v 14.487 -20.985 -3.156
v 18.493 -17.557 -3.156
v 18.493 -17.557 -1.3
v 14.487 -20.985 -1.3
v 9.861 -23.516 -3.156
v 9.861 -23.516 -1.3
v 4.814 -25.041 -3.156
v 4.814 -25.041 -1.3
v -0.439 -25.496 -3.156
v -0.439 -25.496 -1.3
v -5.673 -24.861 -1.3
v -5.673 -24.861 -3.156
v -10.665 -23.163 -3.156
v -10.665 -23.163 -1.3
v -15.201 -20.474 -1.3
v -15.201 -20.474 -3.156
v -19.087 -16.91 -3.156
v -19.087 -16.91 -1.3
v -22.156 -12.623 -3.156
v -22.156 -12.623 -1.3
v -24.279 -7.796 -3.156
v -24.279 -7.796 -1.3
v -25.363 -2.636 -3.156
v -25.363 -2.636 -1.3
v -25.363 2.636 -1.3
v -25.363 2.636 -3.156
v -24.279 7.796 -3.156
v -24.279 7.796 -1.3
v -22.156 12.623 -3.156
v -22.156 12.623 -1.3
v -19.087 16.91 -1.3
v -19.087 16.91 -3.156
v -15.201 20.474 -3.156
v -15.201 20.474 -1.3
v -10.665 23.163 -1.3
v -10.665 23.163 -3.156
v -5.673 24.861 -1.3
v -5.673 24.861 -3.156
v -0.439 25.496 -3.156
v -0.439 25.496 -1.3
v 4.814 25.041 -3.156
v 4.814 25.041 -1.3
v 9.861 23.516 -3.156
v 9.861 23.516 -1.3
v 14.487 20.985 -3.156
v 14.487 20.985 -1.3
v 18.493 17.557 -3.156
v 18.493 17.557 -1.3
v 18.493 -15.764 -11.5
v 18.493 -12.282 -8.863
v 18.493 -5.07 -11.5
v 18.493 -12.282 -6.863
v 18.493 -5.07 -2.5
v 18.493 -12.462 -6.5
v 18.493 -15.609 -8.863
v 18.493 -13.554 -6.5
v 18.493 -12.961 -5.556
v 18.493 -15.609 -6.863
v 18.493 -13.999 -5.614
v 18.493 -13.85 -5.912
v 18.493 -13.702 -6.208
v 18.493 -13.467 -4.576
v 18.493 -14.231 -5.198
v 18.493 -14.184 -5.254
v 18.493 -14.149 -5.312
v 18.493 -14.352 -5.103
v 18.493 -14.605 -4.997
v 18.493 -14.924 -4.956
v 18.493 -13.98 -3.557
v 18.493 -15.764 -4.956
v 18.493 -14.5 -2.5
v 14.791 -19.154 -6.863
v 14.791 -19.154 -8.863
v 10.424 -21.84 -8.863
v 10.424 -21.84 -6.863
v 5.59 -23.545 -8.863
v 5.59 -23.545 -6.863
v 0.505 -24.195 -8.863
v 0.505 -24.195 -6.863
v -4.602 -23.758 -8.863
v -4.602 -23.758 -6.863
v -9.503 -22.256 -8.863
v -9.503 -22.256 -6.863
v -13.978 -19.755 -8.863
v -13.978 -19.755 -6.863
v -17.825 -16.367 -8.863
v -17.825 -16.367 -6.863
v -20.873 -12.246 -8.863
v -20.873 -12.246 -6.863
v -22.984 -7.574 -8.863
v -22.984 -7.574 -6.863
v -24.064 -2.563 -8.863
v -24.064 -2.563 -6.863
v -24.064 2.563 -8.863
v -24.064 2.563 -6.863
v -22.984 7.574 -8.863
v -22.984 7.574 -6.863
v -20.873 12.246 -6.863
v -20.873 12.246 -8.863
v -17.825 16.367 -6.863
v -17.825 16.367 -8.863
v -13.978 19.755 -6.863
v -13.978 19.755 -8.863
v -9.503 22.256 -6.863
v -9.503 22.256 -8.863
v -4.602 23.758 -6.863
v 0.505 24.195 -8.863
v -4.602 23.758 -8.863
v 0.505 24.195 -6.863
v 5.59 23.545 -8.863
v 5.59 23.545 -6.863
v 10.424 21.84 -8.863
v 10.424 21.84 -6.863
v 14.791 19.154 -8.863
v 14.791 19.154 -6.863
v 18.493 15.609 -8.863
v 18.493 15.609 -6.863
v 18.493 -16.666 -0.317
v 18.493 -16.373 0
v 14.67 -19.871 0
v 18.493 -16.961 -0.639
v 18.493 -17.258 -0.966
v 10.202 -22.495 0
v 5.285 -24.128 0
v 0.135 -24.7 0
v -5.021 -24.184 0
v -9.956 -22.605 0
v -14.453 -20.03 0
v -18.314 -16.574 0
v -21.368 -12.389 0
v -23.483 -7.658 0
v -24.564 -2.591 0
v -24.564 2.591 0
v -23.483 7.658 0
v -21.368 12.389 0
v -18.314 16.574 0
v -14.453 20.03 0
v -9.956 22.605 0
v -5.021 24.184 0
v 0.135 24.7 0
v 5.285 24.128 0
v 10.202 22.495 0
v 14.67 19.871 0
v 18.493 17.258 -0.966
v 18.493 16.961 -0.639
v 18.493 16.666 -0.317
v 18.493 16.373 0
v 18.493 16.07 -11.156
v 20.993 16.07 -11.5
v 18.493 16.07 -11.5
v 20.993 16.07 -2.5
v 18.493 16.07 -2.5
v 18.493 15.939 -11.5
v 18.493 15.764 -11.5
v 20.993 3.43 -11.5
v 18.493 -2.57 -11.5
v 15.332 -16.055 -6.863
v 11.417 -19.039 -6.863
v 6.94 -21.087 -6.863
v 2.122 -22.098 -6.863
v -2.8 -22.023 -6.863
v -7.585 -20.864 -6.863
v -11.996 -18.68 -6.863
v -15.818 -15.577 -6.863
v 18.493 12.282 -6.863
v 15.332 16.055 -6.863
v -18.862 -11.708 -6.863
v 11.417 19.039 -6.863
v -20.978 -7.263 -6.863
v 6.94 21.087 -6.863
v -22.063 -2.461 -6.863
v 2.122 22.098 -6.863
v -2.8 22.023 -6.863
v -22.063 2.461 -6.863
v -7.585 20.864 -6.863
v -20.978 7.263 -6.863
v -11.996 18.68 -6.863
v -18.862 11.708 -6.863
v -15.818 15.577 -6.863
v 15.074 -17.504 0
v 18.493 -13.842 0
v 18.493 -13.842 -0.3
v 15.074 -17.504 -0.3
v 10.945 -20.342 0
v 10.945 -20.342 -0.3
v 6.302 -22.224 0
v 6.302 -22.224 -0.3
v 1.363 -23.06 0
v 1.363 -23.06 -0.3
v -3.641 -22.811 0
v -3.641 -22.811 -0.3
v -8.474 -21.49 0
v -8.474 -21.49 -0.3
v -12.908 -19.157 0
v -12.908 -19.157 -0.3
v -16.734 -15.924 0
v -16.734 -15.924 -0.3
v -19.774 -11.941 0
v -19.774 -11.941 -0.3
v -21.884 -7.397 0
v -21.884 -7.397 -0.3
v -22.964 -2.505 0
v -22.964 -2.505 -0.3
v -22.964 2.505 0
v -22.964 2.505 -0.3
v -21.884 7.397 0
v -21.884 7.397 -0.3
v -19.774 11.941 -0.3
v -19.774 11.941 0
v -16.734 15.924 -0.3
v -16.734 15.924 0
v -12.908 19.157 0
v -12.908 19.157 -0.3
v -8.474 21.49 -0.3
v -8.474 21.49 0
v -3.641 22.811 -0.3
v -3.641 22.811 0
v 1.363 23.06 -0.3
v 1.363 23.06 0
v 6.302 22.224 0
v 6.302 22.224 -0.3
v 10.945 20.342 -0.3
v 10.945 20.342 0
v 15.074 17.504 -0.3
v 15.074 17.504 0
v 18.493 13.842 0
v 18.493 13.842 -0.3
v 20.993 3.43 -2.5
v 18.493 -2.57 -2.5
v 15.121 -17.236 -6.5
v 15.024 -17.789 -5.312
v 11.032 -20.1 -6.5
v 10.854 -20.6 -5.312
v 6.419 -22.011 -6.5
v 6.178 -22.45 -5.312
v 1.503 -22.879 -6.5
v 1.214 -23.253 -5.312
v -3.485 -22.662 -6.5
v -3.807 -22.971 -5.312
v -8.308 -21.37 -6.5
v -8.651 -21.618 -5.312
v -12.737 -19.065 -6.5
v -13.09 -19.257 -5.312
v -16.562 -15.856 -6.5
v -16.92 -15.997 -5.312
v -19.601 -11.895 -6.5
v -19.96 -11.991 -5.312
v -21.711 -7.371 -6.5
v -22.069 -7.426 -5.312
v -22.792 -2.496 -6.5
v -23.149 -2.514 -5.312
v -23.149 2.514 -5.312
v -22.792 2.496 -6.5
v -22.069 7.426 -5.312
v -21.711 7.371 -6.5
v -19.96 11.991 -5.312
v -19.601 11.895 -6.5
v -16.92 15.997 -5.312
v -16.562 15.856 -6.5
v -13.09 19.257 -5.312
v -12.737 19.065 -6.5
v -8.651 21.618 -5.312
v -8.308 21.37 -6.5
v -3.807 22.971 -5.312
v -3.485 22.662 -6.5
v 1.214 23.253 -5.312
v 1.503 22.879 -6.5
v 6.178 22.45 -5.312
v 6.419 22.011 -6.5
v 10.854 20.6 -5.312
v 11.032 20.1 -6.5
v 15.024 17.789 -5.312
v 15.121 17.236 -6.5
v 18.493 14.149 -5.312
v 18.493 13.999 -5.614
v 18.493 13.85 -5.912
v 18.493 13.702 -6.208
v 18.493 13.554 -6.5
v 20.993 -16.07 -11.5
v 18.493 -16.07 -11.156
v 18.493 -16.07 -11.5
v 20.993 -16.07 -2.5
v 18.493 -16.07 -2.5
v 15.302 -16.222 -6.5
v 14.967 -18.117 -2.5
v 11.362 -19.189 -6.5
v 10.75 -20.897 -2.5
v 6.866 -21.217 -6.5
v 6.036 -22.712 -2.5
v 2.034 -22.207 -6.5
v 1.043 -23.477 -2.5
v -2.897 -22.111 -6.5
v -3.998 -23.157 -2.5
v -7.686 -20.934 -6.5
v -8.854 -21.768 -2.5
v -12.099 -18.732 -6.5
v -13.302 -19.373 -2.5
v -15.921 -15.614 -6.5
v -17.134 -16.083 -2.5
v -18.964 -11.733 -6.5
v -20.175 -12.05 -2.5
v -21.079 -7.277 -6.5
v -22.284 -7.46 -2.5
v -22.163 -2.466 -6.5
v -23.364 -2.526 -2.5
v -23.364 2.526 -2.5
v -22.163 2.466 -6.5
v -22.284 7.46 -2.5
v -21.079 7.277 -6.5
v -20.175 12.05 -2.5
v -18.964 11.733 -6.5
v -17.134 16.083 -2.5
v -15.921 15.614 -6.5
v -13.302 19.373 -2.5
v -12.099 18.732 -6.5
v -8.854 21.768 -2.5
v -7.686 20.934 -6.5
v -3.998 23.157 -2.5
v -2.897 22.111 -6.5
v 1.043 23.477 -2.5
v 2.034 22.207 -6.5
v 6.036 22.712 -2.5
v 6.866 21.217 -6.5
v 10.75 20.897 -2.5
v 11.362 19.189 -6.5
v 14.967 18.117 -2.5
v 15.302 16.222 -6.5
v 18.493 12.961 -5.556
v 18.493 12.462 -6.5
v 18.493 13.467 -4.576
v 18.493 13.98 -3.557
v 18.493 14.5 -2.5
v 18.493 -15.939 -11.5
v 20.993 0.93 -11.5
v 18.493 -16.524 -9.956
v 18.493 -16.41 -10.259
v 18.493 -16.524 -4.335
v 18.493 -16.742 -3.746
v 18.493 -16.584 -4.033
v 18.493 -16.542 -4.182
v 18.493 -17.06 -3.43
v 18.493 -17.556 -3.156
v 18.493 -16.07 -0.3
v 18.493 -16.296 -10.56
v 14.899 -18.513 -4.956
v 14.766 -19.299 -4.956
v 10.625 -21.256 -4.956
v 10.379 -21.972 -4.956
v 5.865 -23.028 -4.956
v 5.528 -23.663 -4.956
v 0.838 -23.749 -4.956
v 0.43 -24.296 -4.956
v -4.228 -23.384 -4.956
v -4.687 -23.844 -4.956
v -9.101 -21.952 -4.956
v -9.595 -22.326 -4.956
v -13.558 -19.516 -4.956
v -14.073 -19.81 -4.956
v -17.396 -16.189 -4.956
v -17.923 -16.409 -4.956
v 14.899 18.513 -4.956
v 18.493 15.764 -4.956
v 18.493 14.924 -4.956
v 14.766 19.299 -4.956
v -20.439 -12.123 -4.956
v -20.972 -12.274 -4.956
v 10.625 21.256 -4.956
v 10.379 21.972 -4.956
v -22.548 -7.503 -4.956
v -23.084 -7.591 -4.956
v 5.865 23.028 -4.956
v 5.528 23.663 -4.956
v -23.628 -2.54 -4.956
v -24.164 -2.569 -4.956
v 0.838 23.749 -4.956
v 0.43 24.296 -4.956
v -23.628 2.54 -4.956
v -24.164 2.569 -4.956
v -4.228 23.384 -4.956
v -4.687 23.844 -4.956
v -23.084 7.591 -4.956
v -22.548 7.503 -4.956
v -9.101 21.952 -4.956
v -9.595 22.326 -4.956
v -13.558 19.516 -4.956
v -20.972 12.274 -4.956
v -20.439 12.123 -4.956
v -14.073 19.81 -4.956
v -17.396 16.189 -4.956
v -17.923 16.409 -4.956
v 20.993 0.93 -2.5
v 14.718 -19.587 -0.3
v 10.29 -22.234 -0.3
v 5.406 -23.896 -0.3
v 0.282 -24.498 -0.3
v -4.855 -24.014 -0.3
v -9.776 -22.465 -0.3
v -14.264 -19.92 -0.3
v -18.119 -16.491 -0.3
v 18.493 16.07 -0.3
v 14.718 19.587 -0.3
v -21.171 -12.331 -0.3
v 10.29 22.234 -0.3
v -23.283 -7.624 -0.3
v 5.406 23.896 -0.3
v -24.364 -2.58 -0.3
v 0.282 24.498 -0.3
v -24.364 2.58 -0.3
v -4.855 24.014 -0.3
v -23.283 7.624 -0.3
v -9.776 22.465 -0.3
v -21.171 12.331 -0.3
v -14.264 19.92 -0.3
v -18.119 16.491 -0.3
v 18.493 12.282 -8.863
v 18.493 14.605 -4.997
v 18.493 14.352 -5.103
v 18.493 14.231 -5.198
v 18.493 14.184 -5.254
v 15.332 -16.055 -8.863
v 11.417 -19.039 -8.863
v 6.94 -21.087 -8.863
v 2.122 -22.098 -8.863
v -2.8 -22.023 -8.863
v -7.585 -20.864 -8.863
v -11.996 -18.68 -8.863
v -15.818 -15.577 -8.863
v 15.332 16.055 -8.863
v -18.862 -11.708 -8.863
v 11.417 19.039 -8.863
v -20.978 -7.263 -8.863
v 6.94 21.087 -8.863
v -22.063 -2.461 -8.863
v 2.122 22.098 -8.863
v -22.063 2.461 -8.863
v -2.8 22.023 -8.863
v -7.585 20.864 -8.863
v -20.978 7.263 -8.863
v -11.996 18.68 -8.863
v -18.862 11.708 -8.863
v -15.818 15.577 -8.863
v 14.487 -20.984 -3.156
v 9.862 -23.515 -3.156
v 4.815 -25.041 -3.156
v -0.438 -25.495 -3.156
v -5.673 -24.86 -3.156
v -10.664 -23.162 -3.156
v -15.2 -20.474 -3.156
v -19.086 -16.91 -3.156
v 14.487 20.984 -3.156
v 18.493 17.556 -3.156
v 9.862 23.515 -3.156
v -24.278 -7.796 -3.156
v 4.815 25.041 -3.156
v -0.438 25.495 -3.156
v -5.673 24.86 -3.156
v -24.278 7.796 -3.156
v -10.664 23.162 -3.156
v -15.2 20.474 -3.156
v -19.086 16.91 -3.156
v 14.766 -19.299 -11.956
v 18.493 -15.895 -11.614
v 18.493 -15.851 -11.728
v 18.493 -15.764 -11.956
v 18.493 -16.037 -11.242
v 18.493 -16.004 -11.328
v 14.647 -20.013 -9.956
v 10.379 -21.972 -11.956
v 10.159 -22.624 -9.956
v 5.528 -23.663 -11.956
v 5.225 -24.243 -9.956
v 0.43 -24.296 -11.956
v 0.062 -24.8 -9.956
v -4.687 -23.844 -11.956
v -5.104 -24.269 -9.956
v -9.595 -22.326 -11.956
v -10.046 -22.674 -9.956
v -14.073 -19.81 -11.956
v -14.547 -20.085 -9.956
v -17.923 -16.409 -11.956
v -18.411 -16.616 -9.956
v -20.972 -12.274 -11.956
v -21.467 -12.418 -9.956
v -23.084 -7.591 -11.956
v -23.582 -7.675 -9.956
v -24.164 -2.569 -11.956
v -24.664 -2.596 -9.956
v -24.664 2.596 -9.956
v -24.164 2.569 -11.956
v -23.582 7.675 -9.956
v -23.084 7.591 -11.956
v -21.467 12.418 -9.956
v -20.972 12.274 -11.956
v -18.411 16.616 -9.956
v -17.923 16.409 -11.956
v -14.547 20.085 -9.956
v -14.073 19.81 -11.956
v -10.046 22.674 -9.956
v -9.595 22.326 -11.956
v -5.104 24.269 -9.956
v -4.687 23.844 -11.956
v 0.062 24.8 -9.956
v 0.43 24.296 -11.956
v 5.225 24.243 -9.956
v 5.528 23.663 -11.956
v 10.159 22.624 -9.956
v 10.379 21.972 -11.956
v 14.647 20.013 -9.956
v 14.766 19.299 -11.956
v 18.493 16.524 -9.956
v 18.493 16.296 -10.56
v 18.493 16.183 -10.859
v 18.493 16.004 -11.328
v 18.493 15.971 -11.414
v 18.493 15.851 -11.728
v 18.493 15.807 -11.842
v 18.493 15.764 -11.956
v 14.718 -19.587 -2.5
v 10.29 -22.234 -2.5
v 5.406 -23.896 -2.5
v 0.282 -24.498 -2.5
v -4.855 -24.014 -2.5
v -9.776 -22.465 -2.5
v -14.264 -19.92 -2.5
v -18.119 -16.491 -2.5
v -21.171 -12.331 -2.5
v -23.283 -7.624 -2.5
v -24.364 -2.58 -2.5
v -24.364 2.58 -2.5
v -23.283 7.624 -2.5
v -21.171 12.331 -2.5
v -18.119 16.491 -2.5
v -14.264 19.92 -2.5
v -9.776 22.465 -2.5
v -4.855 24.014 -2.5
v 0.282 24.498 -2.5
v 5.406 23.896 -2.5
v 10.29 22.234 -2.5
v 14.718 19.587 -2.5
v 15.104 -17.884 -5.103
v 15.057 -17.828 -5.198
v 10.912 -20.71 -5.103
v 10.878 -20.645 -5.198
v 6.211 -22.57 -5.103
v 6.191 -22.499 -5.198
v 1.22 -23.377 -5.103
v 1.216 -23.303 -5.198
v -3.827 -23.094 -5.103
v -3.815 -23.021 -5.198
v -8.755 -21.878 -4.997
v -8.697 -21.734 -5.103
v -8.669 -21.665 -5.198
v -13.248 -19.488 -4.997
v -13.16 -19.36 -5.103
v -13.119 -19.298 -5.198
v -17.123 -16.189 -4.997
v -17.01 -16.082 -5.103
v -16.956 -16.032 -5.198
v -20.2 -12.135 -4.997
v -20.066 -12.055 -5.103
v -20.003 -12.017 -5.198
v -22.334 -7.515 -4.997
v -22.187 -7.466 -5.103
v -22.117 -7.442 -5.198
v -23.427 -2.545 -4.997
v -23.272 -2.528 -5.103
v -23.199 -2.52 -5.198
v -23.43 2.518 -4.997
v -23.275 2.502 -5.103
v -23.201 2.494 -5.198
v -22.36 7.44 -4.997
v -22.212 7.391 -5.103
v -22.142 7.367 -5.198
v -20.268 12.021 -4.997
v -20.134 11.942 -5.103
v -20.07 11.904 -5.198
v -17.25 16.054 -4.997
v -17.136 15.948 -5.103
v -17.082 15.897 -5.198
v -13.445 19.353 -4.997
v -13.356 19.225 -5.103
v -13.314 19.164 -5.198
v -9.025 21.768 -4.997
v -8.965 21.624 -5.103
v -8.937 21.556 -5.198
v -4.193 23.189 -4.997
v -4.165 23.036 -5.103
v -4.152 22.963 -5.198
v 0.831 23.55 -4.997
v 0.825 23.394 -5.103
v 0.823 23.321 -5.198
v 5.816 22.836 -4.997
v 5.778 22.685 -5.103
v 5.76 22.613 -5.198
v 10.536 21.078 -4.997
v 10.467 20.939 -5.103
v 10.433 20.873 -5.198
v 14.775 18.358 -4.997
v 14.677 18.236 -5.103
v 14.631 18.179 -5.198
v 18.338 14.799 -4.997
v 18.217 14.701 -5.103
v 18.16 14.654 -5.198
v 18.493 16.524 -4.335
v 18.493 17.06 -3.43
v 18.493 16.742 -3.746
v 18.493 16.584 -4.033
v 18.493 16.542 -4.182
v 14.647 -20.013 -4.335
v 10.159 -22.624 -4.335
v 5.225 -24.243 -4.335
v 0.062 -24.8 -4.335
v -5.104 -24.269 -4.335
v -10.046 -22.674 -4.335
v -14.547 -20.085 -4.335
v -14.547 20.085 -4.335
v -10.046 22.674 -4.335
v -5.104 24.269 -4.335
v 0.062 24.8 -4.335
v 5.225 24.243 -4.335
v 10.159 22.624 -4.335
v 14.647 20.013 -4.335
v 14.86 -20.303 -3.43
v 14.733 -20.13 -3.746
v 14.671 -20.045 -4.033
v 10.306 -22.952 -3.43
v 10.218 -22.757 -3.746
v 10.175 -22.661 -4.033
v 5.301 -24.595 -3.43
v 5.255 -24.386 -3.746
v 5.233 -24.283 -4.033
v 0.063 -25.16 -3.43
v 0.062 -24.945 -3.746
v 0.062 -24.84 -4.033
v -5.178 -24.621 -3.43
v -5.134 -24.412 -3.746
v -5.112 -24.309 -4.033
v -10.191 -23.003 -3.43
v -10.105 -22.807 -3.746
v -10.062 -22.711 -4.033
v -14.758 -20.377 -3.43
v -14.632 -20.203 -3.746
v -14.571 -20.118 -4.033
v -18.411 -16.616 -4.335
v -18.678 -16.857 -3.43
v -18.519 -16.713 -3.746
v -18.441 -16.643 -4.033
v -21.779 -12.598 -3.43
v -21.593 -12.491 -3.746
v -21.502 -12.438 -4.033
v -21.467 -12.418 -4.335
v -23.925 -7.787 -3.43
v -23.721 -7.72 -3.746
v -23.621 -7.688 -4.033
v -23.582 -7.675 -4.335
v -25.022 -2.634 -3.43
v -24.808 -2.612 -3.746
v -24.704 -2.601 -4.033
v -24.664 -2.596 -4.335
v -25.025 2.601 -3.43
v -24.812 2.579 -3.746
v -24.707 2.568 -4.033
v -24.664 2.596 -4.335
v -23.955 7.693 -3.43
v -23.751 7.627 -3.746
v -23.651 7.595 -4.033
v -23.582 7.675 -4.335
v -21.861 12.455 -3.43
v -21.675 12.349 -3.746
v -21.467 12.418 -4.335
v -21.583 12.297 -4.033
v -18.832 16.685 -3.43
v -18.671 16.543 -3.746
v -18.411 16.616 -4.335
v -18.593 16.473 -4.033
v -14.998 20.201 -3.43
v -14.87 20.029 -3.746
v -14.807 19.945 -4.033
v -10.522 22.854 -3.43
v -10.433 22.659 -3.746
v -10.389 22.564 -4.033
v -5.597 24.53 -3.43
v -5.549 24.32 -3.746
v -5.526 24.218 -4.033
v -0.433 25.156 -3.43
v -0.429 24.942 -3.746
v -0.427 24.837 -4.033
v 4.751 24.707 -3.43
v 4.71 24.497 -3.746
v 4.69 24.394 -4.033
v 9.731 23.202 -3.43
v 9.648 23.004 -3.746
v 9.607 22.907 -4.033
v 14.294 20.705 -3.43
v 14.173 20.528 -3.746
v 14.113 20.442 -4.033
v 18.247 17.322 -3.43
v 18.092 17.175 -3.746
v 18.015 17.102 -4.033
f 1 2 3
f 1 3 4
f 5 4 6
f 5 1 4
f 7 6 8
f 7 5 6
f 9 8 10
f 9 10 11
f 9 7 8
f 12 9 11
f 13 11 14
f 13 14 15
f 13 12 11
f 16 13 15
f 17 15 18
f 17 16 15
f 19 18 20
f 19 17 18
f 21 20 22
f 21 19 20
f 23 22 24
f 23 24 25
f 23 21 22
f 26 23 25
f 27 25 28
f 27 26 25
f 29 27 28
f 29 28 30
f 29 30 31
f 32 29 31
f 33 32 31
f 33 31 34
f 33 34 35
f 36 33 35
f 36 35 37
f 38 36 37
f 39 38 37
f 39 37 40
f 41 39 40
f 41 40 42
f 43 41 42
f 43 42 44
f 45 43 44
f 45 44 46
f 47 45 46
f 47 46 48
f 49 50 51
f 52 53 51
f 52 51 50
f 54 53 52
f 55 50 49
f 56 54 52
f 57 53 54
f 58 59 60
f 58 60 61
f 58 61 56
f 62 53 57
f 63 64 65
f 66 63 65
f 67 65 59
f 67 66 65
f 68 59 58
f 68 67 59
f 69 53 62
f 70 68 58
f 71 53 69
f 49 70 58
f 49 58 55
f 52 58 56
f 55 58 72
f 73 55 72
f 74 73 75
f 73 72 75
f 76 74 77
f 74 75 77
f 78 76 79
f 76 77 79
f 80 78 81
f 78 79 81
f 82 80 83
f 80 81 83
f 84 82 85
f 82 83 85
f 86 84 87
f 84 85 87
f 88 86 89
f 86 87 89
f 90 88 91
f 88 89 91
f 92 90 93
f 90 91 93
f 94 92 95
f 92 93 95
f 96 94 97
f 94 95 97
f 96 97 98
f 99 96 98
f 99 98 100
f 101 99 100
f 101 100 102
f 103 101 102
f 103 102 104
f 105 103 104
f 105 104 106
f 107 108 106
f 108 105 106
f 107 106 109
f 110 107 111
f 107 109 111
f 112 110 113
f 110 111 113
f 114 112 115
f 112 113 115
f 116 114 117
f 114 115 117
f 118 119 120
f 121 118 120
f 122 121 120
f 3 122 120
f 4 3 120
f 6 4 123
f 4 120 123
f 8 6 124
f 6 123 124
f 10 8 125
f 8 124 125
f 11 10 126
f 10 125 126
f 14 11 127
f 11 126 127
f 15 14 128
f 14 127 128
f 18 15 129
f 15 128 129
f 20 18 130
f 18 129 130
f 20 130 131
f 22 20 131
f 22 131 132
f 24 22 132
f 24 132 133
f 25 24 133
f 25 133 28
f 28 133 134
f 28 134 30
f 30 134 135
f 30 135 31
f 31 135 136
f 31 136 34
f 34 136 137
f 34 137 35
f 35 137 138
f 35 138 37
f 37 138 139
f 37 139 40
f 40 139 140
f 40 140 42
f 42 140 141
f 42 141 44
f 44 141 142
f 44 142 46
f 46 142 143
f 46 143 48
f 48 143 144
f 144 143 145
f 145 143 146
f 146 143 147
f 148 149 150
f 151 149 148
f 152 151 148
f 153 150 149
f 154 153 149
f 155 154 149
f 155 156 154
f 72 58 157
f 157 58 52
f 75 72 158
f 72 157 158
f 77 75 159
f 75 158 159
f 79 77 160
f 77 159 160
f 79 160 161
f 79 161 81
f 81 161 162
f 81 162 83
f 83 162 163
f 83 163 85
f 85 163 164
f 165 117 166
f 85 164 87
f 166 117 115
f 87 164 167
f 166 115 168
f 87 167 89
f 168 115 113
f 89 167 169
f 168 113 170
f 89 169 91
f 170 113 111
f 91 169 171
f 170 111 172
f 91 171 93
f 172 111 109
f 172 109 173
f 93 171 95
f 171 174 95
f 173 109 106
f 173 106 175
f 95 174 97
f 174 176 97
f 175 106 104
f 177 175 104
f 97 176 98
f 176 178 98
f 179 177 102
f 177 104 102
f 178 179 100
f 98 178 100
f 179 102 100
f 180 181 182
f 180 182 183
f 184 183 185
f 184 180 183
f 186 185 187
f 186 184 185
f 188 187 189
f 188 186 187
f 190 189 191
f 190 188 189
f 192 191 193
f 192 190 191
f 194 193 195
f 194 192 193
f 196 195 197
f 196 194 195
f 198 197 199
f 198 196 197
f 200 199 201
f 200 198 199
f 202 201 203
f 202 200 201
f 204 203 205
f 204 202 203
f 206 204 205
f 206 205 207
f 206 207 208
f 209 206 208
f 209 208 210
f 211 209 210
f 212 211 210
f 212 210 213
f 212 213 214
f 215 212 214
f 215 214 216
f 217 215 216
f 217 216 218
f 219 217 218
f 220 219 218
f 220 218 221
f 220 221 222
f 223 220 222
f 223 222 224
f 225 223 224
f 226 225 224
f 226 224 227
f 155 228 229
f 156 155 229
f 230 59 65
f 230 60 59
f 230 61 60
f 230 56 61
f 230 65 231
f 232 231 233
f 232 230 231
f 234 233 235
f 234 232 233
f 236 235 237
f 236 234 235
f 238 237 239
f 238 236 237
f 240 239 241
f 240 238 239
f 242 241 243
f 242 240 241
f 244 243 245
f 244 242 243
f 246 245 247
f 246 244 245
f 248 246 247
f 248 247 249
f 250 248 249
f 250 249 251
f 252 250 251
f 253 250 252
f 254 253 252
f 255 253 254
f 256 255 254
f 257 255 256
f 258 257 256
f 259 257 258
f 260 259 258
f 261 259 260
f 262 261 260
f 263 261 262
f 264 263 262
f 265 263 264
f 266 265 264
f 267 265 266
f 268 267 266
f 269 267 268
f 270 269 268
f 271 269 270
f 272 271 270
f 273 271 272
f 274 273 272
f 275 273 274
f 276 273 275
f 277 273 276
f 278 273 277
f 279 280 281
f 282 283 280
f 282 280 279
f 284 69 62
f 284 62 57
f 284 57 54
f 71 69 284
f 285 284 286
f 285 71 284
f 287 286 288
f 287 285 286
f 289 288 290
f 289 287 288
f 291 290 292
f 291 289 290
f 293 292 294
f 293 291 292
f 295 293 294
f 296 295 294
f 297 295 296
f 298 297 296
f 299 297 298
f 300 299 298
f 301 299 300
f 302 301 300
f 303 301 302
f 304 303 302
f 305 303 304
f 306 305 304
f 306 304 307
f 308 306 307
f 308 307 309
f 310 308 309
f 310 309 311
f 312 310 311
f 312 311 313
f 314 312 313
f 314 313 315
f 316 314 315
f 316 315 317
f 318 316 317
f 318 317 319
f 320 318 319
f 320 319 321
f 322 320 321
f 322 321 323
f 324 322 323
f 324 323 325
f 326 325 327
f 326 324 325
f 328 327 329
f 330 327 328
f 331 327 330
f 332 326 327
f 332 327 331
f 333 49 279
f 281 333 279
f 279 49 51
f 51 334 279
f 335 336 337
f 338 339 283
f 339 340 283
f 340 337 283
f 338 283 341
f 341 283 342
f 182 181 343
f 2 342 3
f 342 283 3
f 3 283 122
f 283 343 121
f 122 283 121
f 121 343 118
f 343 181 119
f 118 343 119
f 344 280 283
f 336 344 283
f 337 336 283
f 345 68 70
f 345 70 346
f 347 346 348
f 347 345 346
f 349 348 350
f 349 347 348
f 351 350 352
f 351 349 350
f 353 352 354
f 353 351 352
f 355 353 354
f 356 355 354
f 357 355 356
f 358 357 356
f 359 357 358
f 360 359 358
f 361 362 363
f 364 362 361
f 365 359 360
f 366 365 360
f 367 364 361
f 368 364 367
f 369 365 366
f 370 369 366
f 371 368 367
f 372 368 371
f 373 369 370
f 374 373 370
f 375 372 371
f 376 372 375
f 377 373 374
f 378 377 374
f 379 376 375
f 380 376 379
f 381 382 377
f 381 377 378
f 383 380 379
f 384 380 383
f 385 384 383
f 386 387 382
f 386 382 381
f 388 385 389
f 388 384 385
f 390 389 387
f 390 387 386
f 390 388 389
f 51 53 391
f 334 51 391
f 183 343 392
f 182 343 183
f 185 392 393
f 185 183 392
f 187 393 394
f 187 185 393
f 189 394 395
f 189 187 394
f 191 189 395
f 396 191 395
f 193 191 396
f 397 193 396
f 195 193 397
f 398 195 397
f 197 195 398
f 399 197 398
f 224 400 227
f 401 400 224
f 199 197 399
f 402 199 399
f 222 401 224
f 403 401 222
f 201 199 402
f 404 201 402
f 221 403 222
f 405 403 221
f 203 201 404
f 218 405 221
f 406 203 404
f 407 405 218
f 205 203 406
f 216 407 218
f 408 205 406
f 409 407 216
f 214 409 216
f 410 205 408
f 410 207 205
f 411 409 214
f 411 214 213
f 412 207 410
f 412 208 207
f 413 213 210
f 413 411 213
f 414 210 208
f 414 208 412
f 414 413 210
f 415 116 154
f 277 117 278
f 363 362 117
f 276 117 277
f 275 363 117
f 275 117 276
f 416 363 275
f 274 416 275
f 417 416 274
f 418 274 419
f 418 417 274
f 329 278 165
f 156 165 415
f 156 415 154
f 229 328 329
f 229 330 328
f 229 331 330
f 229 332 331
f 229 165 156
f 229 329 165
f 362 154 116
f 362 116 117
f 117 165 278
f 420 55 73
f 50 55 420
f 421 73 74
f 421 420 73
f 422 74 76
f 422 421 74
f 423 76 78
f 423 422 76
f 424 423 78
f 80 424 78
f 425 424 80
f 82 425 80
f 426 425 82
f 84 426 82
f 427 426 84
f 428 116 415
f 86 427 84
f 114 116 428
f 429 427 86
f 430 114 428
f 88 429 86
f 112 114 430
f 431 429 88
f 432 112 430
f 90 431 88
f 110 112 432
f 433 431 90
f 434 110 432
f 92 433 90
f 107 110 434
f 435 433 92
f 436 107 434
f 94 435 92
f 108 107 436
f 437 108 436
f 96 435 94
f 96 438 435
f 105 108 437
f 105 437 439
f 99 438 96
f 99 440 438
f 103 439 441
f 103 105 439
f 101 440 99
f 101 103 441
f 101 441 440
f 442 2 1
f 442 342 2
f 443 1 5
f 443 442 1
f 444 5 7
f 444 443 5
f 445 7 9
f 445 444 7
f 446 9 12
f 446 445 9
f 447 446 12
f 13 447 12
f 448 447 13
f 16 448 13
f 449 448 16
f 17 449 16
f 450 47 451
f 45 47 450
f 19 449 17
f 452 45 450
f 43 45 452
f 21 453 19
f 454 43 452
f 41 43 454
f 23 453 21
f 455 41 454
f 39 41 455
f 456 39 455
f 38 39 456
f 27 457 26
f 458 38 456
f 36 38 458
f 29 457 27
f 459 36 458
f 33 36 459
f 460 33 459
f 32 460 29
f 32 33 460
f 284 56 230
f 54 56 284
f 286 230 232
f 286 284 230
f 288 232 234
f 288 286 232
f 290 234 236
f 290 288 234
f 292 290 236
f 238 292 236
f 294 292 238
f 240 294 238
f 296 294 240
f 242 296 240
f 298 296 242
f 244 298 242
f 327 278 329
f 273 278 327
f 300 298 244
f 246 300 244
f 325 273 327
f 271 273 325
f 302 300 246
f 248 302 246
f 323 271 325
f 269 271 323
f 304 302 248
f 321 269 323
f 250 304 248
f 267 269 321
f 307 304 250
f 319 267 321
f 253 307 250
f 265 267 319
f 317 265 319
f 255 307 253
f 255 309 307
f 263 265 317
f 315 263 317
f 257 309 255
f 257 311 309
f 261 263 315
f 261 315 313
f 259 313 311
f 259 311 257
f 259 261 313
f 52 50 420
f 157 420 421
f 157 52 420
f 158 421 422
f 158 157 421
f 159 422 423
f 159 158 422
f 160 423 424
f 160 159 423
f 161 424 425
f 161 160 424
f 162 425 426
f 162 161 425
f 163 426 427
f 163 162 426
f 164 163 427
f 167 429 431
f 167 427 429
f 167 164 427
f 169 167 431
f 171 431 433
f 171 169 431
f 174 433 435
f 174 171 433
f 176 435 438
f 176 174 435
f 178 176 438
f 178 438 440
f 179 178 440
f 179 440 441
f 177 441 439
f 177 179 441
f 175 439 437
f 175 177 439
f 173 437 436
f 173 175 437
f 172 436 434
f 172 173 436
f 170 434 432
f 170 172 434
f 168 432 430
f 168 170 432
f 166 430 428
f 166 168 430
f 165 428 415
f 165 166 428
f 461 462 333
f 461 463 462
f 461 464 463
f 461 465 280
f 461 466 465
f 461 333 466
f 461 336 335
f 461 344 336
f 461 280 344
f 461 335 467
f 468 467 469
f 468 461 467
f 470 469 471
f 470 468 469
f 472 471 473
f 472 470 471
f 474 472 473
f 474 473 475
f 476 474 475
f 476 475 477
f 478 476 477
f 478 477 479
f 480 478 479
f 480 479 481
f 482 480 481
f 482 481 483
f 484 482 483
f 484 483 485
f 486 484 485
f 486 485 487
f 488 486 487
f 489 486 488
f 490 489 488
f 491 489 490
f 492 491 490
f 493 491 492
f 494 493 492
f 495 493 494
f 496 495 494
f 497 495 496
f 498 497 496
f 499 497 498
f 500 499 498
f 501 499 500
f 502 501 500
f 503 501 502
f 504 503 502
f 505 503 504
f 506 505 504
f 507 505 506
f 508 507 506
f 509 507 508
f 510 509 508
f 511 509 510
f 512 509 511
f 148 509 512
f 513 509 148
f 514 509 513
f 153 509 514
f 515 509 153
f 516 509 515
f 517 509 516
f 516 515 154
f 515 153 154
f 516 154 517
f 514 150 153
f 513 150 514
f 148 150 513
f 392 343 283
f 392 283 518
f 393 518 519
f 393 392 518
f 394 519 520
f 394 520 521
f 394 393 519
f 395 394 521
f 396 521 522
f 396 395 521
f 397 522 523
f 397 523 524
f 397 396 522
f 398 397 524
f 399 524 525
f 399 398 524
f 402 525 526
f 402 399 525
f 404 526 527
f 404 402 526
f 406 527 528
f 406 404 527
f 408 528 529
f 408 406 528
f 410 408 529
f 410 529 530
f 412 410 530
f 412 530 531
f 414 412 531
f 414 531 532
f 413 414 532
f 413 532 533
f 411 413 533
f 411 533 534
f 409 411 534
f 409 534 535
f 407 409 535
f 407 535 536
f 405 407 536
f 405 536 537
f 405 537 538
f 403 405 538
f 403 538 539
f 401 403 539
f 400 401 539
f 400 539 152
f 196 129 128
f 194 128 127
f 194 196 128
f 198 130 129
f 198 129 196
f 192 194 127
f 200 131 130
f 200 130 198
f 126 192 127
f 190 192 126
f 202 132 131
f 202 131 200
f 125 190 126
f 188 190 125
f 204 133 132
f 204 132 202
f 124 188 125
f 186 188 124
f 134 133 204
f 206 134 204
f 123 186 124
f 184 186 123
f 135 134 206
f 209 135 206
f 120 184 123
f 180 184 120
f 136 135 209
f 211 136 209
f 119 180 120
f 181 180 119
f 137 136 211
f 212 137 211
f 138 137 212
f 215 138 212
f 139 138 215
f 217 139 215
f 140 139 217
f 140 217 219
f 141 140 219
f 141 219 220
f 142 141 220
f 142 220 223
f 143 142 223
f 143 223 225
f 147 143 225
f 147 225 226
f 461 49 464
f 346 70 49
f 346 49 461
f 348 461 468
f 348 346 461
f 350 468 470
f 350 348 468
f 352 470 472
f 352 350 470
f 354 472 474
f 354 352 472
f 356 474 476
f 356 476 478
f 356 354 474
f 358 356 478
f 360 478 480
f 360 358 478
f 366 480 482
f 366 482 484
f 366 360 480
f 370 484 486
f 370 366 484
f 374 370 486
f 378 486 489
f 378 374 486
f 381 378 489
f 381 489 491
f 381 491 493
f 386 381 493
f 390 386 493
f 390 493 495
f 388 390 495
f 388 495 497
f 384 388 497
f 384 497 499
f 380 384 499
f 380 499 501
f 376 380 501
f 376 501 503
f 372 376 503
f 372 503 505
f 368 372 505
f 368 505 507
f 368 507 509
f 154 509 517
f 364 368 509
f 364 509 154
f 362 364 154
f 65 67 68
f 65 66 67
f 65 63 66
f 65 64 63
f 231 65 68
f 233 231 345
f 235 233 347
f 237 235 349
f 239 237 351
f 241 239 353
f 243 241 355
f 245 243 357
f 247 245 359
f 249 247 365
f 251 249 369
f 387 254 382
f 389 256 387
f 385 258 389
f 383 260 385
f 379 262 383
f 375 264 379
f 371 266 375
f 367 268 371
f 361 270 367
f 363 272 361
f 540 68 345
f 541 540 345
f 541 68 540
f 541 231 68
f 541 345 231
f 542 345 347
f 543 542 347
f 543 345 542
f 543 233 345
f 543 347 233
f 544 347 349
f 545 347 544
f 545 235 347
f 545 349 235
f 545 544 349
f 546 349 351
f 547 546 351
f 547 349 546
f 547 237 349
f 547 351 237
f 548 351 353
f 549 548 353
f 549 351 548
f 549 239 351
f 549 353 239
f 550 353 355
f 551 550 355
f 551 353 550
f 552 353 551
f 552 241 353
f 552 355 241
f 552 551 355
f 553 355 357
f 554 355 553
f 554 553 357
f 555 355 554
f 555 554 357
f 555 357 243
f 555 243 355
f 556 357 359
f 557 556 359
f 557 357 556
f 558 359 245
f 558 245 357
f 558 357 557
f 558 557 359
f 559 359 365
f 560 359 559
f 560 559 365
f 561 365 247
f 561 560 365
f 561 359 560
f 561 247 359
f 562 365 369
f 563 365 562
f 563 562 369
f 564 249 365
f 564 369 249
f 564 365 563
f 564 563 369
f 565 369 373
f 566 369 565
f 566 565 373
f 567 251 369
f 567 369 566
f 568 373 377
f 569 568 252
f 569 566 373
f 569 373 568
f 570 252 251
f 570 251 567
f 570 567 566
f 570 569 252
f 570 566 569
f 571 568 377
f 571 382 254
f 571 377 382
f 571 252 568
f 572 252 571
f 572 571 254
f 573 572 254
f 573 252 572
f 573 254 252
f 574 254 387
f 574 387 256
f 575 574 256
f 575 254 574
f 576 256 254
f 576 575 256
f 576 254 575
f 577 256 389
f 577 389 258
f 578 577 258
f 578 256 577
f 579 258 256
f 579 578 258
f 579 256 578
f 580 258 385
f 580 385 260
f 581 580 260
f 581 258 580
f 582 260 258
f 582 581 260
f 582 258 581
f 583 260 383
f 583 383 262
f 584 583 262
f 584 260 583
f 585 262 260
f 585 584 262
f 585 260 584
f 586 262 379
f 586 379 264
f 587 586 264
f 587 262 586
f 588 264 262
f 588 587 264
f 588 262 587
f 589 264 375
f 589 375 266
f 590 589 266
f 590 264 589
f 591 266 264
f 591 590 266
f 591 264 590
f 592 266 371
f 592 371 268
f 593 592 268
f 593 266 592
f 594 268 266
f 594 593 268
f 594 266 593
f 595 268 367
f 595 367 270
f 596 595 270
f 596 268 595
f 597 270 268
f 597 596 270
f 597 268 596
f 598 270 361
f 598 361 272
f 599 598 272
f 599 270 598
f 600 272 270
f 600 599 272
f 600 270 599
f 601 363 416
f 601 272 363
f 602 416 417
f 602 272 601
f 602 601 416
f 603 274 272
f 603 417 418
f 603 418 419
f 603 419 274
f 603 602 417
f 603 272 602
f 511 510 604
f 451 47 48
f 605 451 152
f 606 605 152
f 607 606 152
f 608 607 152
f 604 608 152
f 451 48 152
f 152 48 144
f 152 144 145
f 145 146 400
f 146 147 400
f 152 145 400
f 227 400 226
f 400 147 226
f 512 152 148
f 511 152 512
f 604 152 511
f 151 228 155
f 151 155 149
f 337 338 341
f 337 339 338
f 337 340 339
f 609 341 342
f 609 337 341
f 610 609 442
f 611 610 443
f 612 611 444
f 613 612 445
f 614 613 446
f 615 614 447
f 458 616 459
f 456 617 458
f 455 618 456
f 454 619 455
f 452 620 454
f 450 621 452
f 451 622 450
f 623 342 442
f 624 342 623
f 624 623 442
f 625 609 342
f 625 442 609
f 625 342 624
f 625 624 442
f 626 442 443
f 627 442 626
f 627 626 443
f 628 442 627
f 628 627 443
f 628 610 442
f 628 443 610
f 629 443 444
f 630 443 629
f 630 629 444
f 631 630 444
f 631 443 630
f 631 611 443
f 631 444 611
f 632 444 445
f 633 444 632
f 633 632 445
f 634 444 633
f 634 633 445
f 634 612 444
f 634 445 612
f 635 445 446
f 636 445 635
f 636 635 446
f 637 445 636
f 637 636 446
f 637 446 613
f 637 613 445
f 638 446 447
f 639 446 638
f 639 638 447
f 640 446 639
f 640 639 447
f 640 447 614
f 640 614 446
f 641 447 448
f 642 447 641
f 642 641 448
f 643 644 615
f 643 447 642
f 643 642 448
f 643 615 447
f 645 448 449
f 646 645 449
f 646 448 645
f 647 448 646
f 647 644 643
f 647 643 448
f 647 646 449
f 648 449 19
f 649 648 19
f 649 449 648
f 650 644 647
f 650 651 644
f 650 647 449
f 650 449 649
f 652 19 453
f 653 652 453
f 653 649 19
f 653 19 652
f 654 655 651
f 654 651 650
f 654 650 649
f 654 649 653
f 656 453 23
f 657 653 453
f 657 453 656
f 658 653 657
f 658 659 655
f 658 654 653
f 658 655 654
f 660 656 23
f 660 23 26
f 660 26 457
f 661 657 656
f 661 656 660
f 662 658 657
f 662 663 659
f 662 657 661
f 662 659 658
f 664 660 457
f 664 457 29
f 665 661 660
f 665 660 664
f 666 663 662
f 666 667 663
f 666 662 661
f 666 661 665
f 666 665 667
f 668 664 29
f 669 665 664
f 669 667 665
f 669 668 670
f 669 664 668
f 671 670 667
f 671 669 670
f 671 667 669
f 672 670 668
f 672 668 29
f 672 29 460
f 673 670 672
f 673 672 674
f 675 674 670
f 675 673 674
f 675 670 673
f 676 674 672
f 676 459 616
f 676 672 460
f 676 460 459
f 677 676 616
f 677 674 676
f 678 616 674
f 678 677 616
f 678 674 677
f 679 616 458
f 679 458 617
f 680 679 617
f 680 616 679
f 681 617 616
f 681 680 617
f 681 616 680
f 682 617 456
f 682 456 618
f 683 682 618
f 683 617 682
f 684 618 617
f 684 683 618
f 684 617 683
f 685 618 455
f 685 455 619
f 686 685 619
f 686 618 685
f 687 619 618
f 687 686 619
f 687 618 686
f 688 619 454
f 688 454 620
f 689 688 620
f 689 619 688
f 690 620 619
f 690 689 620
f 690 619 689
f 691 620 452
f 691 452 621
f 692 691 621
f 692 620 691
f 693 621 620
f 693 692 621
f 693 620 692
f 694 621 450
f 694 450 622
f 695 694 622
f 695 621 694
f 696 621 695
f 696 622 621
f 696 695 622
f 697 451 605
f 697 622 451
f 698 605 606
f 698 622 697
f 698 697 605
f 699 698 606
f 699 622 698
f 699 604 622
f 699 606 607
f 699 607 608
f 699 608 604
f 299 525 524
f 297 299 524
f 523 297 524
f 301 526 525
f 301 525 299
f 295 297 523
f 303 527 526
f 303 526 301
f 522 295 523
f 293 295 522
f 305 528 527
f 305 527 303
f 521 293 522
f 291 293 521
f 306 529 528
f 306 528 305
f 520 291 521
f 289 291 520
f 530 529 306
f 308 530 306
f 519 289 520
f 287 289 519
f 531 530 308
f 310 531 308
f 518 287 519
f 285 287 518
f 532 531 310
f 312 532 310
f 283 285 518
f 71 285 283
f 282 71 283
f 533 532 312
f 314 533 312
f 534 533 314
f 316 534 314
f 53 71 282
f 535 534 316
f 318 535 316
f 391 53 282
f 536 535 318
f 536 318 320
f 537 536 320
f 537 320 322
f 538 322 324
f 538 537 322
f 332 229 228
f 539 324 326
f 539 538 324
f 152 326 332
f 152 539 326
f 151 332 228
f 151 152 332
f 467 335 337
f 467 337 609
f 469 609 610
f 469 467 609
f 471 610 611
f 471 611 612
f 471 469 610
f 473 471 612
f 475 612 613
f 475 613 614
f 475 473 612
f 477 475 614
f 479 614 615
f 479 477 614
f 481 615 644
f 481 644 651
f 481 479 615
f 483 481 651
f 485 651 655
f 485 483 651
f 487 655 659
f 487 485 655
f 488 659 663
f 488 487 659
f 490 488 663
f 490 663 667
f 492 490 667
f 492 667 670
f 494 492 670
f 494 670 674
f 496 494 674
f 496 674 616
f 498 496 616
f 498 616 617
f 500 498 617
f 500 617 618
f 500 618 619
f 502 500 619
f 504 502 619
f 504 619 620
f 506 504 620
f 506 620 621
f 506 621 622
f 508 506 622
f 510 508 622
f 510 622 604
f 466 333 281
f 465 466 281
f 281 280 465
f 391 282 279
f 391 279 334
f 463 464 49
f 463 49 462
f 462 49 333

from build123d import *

# Parameters (mm, degrees)
F0_W      = 1.4
F0_H      = 0.3
F0_W_2    = 2
F0_H_2    = 2
F4_SIZE2  = 0.49999
F4_SIZE   = 1.99999
F5_R      = 0.5
F7_DEPTH  = 25
F9_DEPTH  = 9
F11_DEPTH = 100


# Not quite as in the source:
# - a fillet or chamfer that OpenCascade refuses, or shapes differently, is made with other operations: its cross-section is extruded or revolved along the edge and cut away or added
# - a fillet or chamfer is up to 0.001 mm smaller than in the source, because OpenCascade refuses the exact size


with BuildPart() as f1:
    # F0 (on Front) → F1 (revolve)
    with BuildSketch(Plane.XZ):
        Polygon((-24.5, 0), (-25.5, 0), (-25.5, -3.1555826106), (-24.8, -3.1555826106), (-24.8, -11.9555826106), (-24.3, -11.9555826106), (-24.3, -4.9555826106), (-23.391673381, -4.9555826106), (-22.9283481642, -6.5), (-22.3, -6.5), (-23.5, -2.5), (-24.5, -2.5), (-24.5, -0.3), align=None)
        with Locations((-23.8, -0.15)):
            Rectangle(F0_W, F0_H)
    revolve(axis=Axis((0, 0, 1.0689813644), (0, 0, -1)))

    # F2: chamfer of 0.8 x 1.3 on 1 edges, made by hand

    # F2_s1 → F2_t2 (revolve, cut)
    with BuildSketch(Plane.XZ):
        Polygon((-25.5, -1.3), (-24.7, 0), (-25.5, 0), align=None)
    revolve(axis=Axis((0, 0, 0), (0, 0, -1)), mode=Mode.SUBTRACT)

    # F3: fillet of radius 1.4 on 1 edges, made by hand

    # F3_s1 → F3_t2 (revolve)
    with BuildSketch(Plane.XZ):
        with BuildLine():
            ThreePointArc((-25.4997998621, -3.1552362801), (-24.9872079854, -3.6681342757), (-24.7996, -4.3685755865))
            Line((-24.7996, -4.3685755865), (-24.6594634315, -4.3685755865))
            ThreePointArc((-24.6594634315, -4.3685755865), (-24.6598634315, -3.7620790985), (-24.6598634315, -3.1555826106))
            Line((-24.6598634315, -3.1555826106), (-24.8, -3.015446042))
            ThreePointArc((-24.8, -3.015446042), (-25.1498999311, -3.015446042), (-25.4296832798, -3.0339023494))
            Line((-25.4296832798, -3.0339023494), (-25.4997998621, -3.1552362801))
        make_face()
    revolve(axis=Axis((0, 0, -3.1555826106), (0, 0, -1)))

    # F4 (size 2 and 0.5 in the source; OpenCascade refuses exactly that, so slightly less here)
    f4_edges = [f1.edges().sort_by_distance(p)[0] for p in [
        (24.8, 0, -11.955583),
    ]]
    chamfer(f4_edges, length=F4_SIZE, length2=F4_SIZE2)

    # F5
    f5_edges = [f1.edges().sort_by_distance(p)[0] for p in [
        (23.391673, 0, -4.955583),
    ]]
    fillet(f5_edges, radius=F5_R)


with BuildPart() as f1b:
    # F0 (on Front) → F1, piece 2 (revolve)
    with BuildSketch(Plane.XZ):
        with Locations((-23.2, -7.8631715626)):
            Rectangle(F0_W_2, F0_H_2)
    revolve(axis=Axis((0, 0, 1.0689813644), (0, 0, -1)))


with BuildPart() as f7_tool:
    # F6 (on Top) → F7 (new body)
    with BuildSketch(Plane.XY):
        Polygon((18.4932420089, 17.5570498661), (18.4932420089, 14.5), (18.4932420089, -14.5), (18.4932420089, -17.5570498661), (23.4932420089, -17.5570498661), (23.4932420089, 17.5570498661), align=None)
        Polygon((18.4932420089, 29.2936375588), (18.4932420089, 17.5570498661), (23.4932420089, 17.5570498661), (23.4932420089, -17.5570498661), (18.4932420089, -17.5570498661), (18.4932420089, -27.3348336816), (60.3667099652, -27.3348336816), (60.3667099652, 29.2936375588), align=None)
    extrude(amount=-F7_DEPTH)


with BuildPart() as f1_1:
    add(f1.part)

    # F7: cut by f7_tool
    add(f7_tool.part, mode=Mode.SUBTRACT)



with BuildPart() as f1b_1:
    add(f1b.part)

    # F7: cut by f7_tool
    add(f7_tool.part, mode=Mode.SUBTRACT)


with BuildPart() as f1_2:
    add(f1_1.part)

    add(f1b_1.part)  # F9 merges F1b
    # F8 (on face) → F9 (join)
    with BuildSketch(Plane.XY.offset(-2.5)):
        Polygon((20.9932420089, 16.07015868), (18.4932420089, 16.07015868), (18.4932420089, 14.5), (18.4932420089, -14.5), (18.4932420089, -16.07015868), (20.9932420089, -16.07015868), align=None)
    extrude(amount=-F9_DEPTH)

    # F10 (on Top) → F11 (cut)
    with BuildSketch(Plane.XY):
        Polygon((28.4932420089, 21.42984132), (15.9932420089, -8.57015868), (15.9932420089, -11.07015868), (28.4932420089, 18.92984132), align=None)
    extrude(amount=-F11_DEPTH, mode=Mode.SUBTRACT)


solid = f1_2.part
